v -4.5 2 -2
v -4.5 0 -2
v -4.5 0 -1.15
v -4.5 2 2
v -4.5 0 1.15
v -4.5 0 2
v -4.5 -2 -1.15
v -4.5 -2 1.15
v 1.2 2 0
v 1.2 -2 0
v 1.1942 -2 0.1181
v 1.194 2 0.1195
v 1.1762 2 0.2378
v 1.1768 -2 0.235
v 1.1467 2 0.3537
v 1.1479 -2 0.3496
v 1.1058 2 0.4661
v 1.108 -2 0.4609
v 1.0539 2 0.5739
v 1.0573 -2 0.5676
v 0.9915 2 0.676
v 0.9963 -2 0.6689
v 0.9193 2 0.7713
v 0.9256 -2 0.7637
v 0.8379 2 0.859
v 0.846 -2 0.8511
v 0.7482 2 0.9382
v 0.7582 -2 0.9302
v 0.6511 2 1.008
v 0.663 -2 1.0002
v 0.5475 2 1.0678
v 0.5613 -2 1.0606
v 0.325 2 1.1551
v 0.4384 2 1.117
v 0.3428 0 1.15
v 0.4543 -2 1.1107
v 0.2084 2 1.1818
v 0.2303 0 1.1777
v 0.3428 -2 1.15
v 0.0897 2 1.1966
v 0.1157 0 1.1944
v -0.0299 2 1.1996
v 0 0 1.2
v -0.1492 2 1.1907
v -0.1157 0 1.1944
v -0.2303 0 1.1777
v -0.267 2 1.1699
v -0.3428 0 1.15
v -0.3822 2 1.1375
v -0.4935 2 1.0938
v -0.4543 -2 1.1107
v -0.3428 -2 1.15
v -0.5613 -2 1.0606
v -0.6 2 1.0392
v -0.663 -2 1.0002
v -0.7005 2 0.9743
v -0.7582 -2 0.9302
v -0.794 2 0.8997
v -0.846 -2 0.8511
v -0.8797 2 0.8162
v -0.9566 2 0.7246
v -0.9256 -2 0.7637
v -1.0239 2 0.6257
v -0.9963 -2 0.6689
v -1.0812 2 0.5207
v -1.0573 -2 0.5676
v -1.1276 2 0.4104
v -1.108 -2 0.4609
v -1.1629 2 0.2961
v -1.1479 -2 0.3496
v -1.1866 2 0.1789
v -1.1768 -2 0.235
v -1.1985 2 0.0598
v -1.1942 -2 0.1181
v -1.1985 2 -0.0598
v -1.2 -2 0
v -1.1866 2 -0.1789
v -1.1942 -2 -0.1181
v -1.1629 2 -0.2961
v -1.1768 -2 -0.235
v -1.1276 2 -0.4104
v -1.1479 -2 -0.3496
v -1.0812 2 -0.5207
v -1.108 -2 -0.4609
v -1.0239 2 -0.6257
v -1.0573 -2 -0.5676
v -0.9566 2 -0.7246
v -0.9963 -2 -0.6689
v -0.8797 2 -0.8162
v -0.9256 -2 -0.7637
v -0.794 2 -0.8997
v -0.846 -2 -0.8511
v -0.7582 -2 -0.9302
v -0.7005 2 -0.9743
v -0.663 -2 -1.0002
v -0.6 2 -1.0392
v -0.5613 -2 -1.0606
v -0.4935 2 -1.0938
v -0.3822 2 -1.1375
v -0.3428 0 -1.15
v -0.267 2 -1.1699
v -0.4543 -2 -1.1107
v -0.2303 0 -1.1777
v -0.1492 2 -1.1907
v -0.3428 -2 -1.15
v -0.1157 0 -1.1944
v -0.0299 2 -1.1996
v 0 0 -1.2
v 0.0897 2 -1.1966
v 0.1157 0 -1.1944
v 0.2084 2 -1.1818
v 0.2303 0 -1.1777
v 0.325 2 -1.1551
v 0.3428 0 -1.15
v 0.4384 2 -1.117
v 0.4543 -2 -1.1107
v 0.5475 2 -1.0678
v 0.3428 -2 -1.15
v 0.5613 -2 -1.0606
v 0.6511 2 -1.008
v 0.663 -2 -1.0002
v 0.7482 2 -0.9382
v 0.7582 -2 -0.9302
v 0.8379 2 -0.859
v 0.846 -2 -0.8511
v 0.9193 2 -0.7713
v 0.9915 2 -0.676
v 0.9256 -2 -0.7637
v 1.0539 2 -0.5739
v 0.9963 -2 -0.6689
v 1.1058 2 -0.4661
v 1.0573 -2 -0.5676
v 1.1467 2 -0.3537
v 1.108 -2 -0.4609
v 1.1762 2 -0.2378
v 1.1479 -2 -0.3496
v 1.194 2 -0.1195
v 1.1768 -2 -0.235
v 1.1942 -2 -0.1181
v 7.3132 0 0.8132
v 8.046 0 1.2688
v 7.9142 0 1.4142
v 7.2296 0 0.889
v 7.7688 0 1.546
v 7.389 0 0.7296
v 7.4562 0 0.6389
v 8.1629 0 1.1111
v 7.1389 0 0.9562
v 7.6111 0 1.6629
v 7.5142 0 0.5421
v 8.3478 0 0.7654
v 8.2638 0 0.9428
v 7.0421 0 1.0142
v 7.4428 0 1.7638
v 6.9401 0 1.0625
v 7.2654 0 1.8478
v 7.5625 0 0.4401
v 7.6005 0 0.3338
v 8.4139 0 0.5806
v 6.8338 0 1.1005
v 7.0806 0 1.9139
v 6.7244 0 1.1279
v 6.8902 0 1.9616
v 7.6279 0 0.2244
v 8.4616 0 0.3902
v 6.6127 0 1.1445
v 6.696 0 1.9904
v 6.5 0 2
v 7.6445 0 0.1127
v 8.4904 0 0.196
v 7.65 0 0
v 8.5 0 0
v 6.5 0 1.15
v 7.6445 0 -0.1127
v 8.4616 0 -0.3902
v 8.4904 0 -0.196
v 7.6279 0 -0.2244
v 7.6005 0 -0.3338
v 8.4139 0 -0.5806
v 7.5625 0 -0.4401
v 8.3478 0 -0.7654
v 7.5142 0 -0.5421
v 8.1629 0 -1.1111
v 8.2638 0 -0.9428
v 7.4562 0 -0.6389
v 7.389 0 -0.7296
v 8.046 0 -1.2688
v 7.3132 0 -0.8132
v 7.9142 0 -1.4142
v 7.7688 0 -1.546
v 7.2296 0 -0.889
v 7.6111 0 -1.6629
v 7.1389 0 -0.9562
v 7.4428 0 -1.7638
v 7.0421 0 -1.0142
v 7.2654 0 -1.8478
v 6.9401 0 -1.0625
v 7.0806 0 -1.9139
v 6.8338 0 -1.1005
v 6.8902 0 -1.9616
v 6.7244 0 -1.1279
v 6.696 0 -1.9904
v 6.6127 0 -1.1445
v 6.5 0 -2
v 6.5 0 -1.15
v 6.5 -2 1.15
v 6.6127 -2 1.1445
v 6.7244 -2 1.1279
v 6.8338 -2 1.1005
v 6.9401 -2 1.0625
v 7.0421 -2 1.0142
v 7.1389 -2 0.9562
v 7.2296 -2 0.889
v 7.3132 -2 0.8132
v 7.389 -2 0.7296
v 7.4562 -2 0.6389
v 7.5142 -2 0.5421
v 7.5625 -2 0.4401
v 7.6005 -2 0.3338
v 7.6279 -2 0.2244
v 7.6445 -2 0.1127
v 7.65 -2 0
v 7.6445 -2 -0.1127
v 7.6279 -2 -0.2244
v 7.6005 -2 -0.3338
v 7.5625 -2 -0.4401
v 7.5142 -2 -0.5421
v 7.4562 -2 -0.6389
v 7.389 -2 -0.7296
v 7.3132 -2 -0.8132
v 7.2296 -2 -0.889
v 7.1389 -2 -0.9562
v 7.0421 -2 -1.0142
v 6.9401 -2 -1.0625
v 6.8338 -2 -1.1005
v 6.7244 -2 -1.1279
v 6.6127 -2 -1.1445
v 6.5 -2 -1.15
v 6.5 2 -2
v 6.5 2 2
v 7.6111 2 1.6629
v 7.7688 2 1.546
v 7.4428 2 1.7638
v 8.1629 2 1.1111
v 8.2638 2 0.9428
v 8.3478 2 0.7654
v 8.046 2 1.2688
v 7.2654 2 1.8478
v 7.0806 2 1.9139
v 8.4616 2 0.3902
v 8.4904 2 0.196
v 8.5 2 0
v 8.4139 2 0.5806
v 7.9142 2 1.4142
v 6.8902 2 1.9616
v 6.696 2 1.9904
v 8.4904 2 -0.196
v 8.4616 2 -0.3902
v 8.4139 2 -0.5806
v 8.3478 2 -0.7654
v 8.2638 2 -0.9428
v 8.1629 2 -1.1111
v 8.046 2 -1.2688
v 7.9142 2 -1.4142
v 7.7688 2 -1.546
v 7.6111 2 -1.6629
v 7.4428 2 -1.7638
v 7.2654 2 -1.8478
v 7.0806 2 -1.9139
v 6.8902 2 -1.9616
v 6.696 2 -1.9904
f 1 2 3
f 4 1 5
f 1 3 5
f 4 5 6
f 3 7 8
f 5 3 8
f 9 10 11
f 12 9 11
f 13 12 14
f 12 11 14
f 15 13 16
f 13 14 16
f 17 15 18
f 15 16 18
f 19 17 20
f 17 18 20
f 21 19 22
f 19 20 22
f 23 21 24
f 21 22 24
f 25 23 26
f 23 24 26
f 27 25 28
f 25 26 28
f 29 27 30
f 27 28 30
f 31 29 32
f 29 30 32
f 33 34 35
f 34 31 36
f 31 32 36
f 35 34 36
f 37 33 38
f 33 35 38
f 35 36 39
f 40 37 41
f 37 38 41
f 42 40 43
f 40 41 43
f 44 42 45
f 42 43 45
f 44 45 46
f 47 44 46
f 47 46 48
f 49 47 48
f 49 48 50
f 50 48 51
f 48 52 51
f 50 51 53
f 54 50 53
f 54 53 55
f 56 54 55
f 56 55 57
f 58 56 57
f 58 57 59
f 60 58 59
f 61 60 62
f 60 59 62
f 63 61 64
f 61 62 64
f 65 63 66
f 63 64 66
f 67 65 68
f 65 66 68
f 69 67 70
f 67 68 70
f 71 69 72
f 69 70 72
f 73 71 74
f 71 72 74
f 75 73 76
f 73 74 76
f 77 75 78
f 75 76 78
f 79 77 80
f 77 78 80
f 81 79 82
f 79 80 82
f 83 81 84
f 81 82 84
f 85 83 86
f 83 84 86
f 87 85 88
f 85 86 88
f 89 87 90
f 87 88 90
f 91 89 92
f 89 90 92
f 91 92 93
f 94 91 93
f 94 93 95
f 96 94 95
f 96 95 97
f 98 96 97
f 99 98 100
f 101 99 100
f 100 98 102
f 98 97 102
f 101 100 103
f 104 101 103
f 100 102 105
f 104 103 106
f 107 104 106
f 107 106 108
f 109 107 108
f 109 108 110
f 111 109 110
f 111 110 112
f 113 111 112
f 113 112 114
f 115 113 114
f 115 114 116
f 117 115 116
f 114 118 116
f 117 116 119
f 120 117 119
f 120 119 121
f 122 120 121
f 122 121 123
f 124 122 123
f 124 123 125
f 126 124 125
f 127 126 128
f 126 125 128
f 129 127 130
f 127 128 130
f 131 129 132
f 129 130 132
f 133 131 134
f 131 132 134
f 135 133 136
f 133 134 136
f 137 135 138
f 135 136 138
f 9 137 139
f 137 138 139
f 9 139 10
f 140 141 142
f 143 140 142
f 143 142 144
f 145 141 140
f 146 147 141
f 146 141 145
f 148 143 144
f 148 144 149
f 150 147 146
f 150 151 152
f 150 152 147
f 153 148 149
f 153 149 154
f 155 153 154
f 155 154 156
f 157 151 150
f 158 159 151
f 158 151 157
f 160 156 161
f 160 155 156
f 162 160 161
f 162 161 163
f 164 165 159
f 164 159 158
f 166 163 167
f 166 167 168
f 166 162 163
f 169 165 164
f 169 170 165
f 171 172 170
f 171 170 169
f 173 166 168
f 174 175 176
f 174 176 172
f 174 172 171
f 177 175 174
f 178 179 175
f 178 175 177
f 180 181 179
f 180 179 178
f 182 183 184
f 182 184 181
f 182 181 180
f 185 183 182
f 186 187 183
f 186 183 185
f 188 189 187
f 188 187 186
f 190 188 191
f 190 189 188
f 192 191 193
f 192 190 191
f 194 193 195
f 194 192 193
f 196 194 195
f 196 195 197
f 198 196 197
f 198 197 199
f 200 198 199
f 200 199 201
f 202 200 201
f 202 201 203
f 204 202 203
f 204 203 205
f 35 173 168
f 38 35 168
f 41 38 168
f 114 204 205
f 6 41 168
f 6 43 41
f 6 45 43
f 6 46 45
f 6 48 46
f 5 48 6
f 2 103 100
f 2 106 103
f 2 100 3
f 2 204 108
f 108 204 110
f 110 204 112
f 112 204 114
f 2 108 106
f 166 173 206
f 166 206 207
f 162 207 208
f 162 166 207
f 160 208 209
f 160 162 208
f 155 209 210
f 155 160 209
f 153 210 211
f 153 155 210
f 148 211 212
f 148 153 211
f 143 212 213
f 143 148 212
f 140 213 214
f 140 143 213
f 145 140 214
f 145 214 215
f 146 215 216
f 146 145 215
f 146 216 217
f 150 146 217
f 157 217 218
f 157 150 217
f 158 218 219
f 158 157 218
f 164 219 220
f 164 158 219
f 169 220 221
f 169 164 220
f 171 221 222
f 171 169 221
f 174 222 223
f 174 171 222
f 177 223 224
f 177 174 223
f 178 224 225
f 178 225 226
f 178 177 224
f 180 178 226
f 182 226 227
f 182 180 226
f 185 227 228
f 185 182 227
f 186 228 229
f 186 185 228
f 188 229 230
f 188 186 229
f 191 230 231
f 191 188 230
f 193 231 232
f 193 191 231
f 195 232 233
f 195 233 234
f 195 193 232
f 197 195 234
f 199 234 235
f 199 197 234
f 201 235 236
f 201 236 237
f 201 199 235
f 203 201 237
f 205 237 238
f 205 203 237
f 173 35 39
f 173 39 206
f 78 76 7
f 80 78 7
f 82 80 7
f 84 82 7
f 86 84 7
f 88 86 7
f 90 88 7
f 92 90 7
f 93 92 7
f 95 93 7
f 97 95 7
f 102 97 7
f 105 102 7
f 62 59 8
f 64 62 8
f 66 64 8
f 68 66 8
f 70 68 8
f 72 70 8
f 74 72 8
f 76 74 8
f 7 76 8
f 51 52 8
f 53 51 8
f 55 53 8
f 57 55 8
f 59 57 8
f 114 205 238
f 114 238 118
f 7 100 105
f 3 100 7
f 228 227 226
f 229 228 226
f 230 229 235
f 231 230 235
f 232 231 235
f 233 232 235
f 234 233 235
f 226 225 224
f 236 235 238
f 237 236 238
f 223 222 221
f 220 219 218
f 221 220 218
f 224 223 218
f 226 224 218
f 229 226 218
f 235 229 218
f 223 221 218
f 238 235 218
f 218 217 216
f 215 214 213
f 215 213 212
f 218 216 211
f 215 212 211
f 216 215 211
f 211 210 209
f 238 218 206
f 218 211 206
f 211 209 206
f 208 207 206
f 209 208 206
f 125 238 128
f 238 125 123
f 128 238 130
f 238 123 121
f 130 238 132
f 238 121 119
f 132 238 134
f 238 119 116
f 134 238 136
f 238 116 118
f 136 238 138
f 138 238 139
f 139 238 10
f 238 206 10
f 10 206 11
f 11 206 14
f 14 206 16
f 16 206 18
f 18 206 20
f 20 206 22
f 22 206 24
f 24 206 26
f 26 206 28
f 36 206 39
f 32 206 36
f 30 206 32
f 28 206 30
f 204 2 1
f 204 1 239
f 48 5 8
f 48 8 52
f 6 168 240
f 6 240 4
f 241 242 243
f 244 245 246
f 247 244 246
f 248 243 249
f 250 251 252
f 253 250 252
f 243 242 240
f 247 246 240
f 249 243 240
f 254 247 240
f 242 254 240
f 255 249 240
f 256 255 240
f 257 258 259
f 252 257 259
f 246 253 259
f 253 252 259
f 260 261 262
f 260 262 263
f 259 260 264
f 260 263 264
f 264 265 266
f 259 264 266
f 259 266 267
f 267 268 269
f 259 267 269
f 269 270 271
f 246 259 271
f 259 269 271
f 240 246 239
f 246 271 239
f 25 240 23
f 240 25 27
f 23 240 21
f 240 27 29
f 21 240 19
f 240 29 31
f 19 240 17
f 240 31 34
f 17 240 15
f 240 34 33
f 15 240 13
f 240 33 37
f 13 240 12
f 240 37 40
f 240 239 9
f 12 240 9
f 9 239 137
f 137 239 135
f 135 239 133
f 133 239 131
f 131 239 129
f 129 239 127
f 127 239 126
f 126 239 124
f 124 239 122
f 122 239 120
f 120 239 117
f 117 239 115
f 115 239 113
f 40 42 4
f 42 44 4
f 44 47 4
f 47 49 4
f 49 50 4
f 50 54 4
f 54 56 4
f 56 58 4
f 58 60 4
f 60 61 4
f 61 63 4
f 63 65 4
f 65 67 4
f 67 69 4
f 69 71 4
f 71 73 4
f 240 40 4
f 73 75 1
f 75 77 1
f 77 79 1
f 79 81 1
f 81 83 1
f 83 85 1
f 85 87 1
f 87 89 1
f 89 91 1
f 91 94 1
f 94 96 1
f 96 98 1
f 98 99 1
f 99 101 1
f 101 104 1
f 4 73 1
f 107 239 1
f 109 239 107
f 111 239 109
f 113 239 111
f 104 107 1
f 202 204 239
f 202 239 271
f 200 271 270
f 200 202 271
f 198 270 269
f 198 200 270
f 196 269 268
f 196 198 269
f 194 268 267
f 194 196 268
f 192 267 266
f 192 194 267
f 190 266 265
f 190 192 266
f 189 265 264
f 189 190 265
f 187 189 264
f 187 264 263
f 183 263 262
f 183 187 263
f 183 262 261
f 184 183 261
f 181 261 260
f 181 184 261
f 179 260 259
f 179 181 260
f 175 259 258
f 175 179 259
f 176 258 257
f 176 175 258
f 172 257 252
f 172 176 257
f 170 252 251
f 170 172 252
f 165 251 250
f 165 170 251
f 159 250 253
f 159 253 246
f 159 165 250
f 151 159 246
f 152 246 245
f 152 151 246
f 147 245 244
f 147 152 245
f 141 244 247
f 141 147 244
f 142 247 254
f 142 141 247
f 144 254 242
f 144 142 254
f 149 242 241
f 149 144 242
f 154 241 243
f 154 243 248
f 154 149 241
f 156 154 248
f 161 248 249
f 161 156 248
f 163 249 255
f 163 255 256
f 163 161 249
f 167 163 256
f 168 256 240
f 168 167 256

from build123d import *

# Parameters (mm, degrees)
BOSS_EXTRUDE1_DEPTH = 2
BOSS_EXTRUDE2_DEPTH = 2
SKETCH3_R           = 1.2
CUT_EXTRUDE1_DEPTH  = 5
SKETCH4_W           = 6
SKETCH4_H           = 6
CUT_EXTRUDE2_DEPTH  = 5


with BuildPart() as part:
    # Sketch1 → Boss-Extrude1 (new body)
    with BuildSketch(Plane(origin=(0, 0, 0), x_dir=(1, 0, 0), z_dir=(0, 1, 0))):
        with BuildLine():
            Line((-6.5, 2), (6.5, 2))
            ThreePointArc((6.5, 2), (8.5, 0), (6.5, -2))
            Line((6.5, -2), (-6.5, -2))
            ThreePointArc((-6.5, -2), (-8.5, 0), (-6.5, 2))
        make_face()
    extrude(amount=BOSS_EXTRUDE1_DEPTH)

    # Sketch2 → Boss-Extrude2 (add)
    with BuildSketch(Plane.XZ):
        with BuildLine():
            Line((-6.5, 1.15), (6.5, 1.15))
            ThreePointArc((6.5, 1.15), (7.65, 0), (6.5, -1.15))
            Line((6.5, -1.15), (-6.5, -1.15))
            ThreePointArc((-6.5, -1.15), (-7.65, 0), (-6.5, 1.15))
        make_face()
    extrude(amount=BOSS_EXTRUDE2_DEPTH)

    # Sketch3 → Cut-Extrude1 (cut, through all)
    with BuildSketch(Plane.XZ.offset(2)):
        Circle(SKETCH3_R)
    extrude(amount=-CUT_EXTRUDE1_DEPTH, mode=Mode.SUBTRACT)

    # Sketch4 → Cut-Extrude2 (cut, through all)
    with BuildSketch(Plane.XZ.offset(2)):
        with Locations((-7.5, 0)):
            Rectangle(SKETCH4_W, SKETCH4_H)
    extrude(amount=-CUT_EXTRUDE2_DEPTH, mode=Mode.SUBTRACT)


solid = part.part
